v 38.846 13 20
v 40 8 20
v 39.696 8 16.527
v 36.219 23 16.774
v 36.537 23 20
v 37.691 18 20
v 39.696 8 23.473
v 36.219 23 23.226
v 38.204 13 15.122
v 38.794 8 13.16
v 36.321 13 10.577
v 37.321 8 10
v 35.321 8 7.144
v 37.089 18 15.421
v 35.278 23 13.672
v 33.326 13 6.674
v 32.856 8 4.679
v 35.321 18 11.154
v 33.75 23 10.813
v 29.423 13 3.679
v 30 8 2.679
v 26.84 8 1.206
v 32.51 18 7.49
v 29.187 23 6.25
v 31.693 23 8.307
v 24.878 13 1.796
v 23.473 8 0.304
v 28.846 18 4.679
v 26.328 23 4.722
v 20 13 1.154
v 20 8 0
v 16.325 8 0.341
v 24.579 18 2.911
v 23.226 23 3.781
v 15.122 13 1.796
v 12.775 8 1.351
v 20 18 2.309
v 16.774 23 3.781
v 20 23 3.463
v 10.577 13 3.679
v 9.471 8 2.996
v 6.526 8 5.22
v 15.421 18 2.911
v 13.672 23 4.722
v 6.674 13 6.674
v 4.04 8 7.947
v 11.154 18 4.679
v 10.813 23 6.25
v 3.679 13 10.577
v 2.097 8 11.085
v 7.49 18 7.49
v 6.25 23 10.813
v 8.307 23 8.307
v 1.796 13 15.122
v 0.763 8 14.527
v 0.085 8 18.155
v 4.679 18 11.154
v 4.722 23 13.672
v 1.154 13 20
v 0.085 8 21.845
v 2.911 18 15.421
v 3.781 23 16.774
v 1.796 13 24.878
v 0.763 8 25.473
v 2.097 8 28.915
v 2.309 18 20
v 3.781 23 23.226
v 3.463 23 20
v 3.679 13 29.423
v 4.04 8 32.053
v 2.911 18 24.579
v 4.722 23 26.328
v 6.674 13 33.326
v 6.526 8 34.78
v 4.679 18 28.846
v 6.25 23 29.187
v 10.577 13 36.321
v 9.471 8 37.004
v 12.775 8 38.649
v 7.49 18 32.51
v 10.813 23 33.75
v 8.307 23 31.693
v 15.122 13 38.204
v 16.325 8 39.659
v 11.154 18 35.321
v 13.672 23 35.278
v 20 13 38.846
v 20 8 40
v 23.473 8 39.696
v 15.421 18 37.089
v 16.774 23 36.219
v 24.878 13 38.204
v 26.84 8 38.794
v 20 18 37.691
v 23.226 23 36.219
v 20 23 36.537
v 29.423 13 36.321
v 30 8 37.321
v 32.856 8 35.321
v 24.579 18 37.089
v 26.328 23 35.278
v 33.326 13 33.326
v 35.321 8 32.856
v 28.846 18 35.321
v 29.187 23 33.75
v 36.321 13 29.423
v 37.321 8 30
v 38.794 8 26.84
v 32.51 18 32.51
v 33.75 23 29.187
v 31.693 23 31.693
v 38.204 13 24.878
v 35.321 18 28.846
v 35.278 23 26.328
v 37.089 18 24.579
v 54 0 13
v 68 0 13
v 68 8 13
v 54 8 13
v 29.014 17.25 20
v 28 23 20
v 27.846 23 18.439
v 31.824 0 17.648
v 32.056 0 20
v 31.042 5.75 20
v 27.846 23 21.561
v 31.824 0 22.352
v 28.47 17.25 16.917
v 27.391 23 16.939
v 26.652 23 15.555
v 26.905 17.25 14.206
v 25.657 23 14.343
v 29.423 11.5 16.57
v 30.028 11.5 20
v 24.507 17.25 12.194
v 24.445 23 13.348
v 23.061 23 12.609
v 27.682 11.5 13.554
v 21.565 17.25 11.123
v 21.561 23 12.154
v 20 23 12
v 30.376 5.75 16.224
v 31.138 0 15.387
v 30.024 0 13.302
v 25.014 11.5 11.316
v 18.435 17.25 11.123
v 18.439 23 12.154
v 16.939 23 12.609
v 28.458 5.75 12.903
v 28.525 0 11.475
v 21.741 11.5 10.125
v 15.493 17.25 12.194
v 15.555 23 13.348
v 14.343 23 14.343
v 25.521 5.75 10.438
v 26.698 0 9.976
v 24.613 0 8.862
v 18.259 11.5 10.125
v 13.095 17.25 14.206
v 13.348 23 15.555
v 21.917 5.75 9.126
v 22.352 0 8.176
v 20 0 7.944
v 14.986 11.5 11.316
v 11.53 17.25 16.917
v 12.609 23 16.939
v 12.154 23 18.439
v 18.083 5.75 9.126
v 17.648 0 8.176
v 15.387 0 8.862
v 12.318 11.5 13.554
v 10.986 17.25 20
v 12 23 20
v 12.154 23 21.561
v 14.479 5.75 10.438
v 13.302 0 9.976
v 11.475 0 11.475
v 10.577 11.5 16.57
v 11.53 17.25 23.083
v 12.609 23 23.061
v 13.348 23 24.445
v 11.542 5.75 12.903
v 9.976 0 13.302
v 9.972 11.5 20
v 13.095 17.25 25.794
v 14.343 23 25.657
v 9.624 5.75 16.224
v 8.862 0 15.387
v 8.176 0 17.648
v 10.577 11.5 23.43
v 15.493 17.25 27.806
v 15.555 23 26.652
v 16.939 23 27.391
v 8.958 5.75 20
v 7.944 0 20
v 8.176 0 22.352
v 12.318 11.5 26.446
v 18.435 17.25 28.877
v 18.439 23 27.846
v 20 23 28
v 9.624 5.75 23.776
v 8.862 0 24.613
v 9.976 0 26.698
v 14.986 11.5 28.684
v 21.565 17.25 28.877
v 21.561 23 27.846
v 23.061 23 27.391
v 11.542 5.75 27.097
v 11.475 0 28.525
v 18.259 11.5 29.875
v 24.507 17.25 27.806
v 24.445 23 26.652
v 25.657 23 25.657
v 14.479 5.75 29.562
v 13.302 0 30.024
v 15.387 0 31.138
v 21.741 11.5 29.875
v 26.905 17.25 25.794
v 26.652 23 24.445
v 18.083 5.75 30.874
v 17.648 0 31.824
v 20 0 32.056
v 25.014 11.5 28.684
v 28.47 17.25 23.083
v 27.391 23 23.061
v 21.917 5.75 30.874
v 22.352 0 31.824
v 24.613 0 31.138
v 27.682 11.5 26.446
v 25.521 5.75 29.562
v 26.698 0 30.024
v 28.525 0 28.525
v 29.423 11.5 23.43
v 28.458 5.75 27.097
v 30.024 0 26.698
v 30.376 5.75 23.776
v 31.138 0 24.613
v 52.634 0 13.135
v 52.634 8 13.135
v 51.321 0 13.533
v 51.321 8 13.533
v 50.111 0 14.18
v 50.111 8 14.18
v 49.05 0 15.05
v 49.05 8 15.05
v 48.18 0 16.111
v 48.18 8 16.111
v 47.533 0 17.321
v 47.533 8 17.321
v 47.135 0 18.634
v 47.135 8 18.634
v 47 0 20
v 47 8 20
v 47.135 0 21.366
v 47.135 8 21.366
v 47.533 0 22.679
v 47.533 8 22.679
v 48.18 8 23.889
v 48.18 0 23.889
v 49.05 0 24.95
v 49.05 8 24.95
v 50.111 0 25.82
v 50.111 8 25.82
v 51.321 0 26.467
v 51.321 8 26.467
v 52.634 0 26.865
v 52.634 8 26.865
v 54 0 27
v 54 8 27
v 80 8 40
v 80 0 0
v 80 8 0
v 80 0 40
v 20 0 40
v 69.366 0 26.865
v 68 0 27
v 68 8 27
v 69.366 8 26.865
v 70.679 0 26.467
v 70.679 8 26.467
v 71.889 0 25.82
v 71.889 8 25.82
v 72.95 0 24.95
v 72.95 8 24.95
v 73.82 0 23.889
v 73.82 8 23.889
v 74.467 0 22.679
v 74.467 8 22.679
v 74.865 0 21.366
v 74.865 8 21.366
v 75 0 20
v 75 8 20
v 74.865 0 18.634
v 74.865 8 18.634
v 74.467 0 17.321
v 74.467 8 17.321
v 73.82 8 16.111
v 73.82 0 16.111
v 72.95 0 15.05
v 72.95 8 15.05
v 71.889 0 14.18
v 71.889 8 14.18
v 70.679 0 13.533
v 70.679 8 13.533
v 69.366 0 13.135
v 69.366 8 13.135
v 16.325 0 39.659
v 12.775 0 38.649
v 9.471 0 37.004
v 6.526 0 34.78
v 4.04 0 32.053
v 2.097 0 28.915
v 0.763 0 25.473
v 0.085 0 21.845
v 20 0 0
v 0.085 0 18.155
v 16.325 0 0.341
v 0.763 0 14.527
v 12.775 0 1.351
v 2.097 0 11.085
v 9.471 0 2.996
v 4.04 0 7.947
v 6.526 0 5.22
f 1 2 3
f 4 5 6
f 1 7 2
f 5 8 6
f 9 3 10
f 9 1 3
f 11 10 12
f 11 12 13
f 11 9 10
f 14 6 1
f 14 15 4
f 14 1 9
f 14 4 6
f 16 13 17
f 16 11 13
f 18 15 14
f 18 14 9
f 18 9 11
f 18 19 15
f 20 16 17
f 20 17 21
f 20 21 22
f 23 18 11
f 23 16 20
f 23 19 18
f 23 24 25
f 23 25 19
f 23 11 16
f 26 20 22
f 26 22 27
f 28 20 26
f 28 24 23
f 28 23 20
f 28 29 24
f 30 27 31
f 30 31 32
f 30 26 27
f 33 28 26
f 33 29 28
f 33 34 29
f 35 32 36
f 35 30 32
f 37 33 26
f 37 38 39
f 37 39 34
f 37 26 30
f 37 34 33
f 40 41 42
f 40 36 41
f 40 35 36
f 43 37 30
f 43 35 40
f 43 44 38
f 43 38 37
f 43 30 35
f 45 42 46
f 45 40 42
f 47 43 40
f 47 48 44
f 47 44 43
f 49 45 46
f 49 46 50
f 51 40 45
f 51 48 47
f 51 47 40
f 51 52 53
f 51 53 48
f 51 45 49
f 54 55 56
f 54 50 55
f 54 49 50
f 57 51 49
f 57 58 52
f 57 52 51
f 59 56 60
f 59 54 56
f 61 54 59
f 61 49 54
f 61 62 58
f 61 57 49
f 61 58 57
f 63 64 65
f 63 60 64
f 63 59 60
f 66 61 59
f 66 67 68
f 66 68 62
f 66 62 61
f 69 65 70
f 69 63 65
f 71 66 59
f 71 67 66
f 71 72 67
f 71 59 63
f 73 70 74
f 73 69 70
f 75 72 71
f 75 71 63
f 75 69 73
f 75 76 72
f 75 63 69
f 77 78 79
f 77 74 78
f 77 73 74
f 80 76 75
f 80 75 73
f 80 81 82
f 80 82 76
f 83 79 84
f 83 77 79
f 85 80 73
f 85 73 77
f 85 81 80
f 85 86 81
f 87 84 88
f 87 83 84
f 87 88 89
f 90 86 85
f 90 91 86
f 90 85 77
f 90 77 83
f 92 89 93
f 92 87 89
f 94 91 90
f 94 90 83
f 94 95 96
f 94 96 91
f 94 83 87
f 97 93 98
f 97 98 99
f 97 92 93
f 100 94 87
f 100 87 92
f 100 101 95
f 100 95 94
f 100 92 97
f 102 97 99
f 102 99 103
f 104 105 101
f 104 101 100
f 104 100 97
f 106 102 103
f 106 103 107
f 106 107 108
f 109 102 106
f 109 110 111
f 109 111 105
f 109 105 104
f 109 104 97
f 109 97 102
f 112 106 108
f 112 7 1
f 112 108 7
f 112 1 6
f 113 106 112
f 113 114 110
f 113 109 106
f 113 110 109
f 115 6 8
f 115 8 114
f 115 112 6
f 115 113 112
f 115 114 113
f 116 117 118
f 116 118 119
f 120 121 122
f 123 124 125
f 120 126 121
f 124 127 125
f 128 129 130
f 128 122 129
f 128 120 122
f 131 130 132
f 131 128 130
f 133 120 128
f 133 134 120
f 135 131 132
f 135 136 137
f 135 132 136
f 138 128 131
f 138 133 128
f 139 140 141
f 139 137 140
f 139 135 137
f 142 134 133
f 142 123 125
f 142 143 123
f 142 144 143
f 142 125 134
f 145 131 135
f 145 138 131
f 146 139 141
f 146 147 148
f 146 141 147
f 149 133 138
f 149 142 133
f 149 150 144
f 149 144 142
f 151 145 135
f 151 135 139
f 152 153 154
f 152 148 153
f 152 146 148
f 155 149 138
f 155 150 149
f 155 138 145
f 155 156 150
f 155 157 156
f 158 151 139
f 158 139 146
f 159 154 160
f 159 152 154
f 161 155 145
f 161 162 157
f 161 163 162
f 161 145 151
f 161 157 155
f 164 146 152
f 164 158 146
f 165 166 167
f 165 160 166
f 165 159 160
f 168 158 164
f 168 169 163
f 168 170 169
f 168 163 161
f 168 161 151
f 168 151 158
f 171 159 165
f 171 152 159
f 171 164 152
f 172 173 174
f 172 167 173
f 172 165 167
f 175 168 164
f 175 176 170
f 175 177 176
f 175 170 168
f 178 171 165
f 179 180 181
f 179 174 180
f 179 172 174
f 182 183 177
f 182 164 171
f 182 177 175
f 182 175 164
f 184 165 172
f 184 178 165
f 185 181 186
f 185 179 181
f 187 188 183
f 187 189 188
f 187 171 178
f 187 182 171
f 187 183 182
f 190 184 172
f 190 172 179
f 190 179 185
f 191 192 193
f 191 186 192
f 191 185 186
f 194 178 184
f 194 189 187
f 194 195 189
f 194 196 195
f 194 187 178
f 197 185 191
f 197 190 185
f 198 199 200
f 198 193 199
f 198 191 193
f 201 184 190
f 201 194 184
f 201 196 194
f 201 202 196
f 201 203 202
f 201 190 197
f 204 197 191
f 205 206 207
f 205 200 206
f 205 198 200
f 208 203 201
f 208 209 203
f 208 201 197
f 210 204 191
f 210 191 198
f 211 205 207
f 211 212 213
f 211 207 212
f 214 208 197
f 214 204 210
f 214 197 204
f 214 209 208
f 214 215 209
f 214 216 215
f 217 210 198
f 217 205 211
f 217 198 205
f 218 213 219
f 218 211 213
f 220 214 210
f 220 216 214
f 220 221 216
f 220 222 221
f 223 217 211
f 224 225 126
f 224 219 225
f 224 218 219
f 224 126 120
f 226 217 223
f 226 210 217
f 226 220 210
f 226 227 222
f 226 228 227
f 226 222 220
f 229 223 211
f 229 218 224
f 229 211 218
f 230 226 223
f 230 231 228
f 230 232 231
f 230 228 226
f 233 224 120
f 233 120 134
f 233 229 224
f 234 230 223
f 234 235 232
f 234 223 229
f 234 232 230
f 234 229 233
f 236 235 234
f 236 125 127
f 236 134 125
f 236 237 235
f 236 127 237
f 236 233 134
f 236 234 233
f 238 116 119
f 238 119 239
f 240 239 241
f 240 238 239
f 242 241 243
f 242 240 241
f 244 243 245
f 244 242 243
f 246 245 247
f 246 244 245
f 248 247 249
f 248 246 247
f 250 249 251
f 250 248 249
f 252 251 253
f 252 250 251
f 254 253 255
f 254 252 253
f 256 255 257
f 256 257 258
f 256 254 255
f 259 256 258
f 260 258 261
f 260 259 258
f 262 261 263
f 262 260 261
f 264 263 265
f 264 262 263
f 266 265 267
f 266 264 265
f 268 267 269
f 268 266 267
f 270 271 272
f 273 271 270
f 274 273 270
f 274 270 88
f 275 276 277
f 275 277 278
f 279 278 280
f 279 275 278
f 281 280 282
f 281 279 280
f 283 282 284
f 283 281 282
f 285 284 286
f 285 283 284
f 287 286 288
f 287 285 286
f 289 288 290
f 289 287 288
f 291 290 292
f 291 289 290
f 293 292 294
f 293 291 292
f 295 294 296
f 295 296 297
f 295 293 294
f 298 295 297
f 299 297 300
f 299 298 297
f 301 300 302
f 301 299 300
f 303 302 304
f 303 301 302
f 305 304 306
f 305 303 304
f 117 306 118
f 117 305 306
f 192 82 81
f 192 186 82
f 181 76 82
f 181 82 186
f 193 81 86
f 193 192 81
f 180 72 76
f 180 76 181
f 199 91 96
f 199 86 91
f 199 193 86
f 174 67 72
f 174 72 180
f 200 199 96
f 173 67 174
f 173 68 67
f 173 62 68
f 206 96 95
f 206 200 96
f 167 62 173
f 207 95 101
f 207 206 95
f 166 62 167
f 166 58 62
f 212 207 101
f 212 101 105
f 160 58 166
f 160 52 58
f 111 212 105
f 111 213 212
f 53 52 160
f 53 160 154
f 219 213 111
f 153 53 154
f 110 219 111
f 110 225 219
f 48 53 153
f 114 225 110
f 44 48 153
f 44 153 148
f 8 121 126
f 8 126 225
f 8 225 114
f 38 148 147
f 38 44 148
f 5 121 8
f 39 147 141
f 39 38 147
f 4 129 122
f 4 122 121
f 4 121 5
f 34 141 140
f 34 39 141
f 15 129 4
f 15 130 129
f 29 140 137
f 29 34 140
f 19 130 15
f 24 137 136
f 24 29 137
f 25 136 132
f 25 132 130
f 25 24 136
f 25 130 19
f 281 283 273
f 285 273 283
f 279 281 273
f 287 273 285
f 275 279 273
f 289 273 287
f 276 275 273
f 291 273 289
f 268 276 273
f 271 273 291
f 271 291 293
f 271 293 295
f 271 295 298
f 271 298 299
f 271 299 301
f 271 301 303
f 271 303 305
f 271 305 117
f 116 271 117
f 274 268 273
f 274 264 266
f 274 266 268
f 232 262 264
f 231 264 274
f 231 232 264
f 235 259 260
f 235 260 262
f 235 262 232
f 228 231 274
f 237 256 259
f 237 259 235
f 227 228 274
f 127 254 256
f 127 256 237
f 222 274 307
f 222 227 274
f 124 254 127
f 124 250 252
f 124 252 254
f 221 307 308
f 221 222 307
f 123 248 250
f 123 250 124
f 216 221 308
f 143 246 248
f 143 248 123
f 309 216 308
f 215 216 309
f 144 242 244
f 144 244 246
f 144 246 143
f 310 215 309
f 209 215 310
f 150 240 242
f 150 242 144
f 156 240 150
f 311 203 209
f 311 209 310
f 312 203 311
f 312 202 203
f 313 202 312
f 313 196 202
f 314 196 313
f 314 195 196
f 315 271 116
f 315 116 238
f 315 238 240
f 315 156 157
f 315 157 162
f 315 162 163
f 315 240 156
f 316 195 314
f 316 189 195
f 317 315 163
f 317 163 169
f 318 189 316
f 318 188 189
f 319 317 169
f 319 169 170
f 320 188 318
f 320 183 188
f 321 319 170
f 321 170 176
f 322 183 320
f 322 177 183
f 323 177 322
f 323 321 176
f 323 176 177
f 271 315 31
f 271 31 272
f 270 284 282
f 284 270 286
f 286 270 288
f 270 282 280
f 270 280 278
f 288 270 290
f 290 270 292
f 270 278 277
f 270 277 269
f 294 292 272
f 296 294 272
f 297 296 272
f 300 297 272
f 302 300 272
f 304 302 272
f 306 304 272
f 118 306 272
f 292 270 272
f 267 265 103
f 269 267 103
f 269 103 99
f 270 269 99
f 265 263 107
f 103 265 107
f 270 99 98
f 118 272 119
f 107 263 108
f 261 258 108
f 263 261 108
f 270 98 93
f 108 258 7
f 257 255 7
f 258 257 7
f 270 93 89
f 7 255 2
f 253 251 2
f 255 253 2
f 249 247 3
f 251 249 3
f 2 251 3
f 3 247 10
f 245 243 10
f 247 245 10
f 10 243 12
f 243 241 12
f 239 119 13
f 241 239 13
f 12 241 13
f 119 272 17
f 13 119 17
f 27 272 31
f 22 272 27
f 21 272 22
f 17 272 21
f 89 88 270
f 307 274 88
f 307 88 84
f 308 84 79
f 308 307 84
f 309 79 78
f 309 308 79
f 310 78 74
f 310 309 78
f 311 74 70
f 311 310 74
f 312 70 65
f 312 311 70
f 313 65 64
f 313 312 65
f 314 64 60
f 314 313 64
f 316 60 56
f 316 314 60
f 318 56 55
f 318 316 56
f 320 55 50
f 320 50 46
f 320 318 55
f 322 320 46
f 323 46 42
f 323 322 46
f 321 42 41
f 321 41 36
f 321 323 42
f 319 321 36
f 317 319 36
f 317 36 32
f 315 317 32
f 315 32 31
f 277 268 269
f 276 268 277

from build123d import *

# Parameters (mm, degrees)
SALIENTE_EXTRUIR1_DEPTH = 8
CROQUIS2_R              = 20
SALIENTE_EXTRUIR2_DEPTH = 15
SALIENTE_EXTRUIR2_TAPER = 13
CROQUIS4_R              = 8
CORTAR_EXTRUIR3_DEPTH   = 23
CORTAR_EXTRUIR3_TAPER   = -10


with BuildPart() as part:
    # Croquis1 → Saliente-Extruir1 (new body)
    with BuildSketch(Plane(origin=(0, 0, 0), x_dir=(1, 0, 0), z_dir=(0, 1, 0))):
        with BuildLine():
            Line((20, 0), (80, 0))
            Line((80, 0), (80, -40))
            Line((80, -40), (20, -40))
            ThreePointArc((20, -40), (0, -20), (20, 0))
        make_face()
        with BuildLine():
            Line((68, -13), (54, -13))
            ThreePointArc((54, -13), (47, -20), (54, -27))
            Line((54, -27), (68, -27))
            ThreePointArc((68, -27), (75, -20), (68, -13))
        make_face(mode=Mode.SUBTRACT)
    extrude(amount=SALIENTE_EXTRUIR1_DEPTH)

    # Croquis2 → Saliente-Extruir2 (add)
    with BuildSketch(Plane(origin=(0, 8, 0), x_dir=(1, 0, 0), z_dir=(0, 1, 0))):
        with Locations((20, -20)):
            Circle(CROQUIS2_R)
    extrude(amount=SALIENTE_EXTRUIR2_DEPTH, taper=SALIENTE_EXTRUIR2_TAPER)

    # Croquis4 → Cortar-Extruir3 (cut)
    with BuildSketch(Plane(origin=(0, 23, 0), x_dir=(1, 0, 0), z_dir=(0, 1, 0))):
        with Locations((20, -20)):
            Circle(CROQUIS4_R)
    extrude(amount=-CORTAR_EXTRUIR3_DEPTH, taper=CORTAR_EXTRUIR3_TAPER, mode=Mode.SUBTRACT)


solid = part.part
